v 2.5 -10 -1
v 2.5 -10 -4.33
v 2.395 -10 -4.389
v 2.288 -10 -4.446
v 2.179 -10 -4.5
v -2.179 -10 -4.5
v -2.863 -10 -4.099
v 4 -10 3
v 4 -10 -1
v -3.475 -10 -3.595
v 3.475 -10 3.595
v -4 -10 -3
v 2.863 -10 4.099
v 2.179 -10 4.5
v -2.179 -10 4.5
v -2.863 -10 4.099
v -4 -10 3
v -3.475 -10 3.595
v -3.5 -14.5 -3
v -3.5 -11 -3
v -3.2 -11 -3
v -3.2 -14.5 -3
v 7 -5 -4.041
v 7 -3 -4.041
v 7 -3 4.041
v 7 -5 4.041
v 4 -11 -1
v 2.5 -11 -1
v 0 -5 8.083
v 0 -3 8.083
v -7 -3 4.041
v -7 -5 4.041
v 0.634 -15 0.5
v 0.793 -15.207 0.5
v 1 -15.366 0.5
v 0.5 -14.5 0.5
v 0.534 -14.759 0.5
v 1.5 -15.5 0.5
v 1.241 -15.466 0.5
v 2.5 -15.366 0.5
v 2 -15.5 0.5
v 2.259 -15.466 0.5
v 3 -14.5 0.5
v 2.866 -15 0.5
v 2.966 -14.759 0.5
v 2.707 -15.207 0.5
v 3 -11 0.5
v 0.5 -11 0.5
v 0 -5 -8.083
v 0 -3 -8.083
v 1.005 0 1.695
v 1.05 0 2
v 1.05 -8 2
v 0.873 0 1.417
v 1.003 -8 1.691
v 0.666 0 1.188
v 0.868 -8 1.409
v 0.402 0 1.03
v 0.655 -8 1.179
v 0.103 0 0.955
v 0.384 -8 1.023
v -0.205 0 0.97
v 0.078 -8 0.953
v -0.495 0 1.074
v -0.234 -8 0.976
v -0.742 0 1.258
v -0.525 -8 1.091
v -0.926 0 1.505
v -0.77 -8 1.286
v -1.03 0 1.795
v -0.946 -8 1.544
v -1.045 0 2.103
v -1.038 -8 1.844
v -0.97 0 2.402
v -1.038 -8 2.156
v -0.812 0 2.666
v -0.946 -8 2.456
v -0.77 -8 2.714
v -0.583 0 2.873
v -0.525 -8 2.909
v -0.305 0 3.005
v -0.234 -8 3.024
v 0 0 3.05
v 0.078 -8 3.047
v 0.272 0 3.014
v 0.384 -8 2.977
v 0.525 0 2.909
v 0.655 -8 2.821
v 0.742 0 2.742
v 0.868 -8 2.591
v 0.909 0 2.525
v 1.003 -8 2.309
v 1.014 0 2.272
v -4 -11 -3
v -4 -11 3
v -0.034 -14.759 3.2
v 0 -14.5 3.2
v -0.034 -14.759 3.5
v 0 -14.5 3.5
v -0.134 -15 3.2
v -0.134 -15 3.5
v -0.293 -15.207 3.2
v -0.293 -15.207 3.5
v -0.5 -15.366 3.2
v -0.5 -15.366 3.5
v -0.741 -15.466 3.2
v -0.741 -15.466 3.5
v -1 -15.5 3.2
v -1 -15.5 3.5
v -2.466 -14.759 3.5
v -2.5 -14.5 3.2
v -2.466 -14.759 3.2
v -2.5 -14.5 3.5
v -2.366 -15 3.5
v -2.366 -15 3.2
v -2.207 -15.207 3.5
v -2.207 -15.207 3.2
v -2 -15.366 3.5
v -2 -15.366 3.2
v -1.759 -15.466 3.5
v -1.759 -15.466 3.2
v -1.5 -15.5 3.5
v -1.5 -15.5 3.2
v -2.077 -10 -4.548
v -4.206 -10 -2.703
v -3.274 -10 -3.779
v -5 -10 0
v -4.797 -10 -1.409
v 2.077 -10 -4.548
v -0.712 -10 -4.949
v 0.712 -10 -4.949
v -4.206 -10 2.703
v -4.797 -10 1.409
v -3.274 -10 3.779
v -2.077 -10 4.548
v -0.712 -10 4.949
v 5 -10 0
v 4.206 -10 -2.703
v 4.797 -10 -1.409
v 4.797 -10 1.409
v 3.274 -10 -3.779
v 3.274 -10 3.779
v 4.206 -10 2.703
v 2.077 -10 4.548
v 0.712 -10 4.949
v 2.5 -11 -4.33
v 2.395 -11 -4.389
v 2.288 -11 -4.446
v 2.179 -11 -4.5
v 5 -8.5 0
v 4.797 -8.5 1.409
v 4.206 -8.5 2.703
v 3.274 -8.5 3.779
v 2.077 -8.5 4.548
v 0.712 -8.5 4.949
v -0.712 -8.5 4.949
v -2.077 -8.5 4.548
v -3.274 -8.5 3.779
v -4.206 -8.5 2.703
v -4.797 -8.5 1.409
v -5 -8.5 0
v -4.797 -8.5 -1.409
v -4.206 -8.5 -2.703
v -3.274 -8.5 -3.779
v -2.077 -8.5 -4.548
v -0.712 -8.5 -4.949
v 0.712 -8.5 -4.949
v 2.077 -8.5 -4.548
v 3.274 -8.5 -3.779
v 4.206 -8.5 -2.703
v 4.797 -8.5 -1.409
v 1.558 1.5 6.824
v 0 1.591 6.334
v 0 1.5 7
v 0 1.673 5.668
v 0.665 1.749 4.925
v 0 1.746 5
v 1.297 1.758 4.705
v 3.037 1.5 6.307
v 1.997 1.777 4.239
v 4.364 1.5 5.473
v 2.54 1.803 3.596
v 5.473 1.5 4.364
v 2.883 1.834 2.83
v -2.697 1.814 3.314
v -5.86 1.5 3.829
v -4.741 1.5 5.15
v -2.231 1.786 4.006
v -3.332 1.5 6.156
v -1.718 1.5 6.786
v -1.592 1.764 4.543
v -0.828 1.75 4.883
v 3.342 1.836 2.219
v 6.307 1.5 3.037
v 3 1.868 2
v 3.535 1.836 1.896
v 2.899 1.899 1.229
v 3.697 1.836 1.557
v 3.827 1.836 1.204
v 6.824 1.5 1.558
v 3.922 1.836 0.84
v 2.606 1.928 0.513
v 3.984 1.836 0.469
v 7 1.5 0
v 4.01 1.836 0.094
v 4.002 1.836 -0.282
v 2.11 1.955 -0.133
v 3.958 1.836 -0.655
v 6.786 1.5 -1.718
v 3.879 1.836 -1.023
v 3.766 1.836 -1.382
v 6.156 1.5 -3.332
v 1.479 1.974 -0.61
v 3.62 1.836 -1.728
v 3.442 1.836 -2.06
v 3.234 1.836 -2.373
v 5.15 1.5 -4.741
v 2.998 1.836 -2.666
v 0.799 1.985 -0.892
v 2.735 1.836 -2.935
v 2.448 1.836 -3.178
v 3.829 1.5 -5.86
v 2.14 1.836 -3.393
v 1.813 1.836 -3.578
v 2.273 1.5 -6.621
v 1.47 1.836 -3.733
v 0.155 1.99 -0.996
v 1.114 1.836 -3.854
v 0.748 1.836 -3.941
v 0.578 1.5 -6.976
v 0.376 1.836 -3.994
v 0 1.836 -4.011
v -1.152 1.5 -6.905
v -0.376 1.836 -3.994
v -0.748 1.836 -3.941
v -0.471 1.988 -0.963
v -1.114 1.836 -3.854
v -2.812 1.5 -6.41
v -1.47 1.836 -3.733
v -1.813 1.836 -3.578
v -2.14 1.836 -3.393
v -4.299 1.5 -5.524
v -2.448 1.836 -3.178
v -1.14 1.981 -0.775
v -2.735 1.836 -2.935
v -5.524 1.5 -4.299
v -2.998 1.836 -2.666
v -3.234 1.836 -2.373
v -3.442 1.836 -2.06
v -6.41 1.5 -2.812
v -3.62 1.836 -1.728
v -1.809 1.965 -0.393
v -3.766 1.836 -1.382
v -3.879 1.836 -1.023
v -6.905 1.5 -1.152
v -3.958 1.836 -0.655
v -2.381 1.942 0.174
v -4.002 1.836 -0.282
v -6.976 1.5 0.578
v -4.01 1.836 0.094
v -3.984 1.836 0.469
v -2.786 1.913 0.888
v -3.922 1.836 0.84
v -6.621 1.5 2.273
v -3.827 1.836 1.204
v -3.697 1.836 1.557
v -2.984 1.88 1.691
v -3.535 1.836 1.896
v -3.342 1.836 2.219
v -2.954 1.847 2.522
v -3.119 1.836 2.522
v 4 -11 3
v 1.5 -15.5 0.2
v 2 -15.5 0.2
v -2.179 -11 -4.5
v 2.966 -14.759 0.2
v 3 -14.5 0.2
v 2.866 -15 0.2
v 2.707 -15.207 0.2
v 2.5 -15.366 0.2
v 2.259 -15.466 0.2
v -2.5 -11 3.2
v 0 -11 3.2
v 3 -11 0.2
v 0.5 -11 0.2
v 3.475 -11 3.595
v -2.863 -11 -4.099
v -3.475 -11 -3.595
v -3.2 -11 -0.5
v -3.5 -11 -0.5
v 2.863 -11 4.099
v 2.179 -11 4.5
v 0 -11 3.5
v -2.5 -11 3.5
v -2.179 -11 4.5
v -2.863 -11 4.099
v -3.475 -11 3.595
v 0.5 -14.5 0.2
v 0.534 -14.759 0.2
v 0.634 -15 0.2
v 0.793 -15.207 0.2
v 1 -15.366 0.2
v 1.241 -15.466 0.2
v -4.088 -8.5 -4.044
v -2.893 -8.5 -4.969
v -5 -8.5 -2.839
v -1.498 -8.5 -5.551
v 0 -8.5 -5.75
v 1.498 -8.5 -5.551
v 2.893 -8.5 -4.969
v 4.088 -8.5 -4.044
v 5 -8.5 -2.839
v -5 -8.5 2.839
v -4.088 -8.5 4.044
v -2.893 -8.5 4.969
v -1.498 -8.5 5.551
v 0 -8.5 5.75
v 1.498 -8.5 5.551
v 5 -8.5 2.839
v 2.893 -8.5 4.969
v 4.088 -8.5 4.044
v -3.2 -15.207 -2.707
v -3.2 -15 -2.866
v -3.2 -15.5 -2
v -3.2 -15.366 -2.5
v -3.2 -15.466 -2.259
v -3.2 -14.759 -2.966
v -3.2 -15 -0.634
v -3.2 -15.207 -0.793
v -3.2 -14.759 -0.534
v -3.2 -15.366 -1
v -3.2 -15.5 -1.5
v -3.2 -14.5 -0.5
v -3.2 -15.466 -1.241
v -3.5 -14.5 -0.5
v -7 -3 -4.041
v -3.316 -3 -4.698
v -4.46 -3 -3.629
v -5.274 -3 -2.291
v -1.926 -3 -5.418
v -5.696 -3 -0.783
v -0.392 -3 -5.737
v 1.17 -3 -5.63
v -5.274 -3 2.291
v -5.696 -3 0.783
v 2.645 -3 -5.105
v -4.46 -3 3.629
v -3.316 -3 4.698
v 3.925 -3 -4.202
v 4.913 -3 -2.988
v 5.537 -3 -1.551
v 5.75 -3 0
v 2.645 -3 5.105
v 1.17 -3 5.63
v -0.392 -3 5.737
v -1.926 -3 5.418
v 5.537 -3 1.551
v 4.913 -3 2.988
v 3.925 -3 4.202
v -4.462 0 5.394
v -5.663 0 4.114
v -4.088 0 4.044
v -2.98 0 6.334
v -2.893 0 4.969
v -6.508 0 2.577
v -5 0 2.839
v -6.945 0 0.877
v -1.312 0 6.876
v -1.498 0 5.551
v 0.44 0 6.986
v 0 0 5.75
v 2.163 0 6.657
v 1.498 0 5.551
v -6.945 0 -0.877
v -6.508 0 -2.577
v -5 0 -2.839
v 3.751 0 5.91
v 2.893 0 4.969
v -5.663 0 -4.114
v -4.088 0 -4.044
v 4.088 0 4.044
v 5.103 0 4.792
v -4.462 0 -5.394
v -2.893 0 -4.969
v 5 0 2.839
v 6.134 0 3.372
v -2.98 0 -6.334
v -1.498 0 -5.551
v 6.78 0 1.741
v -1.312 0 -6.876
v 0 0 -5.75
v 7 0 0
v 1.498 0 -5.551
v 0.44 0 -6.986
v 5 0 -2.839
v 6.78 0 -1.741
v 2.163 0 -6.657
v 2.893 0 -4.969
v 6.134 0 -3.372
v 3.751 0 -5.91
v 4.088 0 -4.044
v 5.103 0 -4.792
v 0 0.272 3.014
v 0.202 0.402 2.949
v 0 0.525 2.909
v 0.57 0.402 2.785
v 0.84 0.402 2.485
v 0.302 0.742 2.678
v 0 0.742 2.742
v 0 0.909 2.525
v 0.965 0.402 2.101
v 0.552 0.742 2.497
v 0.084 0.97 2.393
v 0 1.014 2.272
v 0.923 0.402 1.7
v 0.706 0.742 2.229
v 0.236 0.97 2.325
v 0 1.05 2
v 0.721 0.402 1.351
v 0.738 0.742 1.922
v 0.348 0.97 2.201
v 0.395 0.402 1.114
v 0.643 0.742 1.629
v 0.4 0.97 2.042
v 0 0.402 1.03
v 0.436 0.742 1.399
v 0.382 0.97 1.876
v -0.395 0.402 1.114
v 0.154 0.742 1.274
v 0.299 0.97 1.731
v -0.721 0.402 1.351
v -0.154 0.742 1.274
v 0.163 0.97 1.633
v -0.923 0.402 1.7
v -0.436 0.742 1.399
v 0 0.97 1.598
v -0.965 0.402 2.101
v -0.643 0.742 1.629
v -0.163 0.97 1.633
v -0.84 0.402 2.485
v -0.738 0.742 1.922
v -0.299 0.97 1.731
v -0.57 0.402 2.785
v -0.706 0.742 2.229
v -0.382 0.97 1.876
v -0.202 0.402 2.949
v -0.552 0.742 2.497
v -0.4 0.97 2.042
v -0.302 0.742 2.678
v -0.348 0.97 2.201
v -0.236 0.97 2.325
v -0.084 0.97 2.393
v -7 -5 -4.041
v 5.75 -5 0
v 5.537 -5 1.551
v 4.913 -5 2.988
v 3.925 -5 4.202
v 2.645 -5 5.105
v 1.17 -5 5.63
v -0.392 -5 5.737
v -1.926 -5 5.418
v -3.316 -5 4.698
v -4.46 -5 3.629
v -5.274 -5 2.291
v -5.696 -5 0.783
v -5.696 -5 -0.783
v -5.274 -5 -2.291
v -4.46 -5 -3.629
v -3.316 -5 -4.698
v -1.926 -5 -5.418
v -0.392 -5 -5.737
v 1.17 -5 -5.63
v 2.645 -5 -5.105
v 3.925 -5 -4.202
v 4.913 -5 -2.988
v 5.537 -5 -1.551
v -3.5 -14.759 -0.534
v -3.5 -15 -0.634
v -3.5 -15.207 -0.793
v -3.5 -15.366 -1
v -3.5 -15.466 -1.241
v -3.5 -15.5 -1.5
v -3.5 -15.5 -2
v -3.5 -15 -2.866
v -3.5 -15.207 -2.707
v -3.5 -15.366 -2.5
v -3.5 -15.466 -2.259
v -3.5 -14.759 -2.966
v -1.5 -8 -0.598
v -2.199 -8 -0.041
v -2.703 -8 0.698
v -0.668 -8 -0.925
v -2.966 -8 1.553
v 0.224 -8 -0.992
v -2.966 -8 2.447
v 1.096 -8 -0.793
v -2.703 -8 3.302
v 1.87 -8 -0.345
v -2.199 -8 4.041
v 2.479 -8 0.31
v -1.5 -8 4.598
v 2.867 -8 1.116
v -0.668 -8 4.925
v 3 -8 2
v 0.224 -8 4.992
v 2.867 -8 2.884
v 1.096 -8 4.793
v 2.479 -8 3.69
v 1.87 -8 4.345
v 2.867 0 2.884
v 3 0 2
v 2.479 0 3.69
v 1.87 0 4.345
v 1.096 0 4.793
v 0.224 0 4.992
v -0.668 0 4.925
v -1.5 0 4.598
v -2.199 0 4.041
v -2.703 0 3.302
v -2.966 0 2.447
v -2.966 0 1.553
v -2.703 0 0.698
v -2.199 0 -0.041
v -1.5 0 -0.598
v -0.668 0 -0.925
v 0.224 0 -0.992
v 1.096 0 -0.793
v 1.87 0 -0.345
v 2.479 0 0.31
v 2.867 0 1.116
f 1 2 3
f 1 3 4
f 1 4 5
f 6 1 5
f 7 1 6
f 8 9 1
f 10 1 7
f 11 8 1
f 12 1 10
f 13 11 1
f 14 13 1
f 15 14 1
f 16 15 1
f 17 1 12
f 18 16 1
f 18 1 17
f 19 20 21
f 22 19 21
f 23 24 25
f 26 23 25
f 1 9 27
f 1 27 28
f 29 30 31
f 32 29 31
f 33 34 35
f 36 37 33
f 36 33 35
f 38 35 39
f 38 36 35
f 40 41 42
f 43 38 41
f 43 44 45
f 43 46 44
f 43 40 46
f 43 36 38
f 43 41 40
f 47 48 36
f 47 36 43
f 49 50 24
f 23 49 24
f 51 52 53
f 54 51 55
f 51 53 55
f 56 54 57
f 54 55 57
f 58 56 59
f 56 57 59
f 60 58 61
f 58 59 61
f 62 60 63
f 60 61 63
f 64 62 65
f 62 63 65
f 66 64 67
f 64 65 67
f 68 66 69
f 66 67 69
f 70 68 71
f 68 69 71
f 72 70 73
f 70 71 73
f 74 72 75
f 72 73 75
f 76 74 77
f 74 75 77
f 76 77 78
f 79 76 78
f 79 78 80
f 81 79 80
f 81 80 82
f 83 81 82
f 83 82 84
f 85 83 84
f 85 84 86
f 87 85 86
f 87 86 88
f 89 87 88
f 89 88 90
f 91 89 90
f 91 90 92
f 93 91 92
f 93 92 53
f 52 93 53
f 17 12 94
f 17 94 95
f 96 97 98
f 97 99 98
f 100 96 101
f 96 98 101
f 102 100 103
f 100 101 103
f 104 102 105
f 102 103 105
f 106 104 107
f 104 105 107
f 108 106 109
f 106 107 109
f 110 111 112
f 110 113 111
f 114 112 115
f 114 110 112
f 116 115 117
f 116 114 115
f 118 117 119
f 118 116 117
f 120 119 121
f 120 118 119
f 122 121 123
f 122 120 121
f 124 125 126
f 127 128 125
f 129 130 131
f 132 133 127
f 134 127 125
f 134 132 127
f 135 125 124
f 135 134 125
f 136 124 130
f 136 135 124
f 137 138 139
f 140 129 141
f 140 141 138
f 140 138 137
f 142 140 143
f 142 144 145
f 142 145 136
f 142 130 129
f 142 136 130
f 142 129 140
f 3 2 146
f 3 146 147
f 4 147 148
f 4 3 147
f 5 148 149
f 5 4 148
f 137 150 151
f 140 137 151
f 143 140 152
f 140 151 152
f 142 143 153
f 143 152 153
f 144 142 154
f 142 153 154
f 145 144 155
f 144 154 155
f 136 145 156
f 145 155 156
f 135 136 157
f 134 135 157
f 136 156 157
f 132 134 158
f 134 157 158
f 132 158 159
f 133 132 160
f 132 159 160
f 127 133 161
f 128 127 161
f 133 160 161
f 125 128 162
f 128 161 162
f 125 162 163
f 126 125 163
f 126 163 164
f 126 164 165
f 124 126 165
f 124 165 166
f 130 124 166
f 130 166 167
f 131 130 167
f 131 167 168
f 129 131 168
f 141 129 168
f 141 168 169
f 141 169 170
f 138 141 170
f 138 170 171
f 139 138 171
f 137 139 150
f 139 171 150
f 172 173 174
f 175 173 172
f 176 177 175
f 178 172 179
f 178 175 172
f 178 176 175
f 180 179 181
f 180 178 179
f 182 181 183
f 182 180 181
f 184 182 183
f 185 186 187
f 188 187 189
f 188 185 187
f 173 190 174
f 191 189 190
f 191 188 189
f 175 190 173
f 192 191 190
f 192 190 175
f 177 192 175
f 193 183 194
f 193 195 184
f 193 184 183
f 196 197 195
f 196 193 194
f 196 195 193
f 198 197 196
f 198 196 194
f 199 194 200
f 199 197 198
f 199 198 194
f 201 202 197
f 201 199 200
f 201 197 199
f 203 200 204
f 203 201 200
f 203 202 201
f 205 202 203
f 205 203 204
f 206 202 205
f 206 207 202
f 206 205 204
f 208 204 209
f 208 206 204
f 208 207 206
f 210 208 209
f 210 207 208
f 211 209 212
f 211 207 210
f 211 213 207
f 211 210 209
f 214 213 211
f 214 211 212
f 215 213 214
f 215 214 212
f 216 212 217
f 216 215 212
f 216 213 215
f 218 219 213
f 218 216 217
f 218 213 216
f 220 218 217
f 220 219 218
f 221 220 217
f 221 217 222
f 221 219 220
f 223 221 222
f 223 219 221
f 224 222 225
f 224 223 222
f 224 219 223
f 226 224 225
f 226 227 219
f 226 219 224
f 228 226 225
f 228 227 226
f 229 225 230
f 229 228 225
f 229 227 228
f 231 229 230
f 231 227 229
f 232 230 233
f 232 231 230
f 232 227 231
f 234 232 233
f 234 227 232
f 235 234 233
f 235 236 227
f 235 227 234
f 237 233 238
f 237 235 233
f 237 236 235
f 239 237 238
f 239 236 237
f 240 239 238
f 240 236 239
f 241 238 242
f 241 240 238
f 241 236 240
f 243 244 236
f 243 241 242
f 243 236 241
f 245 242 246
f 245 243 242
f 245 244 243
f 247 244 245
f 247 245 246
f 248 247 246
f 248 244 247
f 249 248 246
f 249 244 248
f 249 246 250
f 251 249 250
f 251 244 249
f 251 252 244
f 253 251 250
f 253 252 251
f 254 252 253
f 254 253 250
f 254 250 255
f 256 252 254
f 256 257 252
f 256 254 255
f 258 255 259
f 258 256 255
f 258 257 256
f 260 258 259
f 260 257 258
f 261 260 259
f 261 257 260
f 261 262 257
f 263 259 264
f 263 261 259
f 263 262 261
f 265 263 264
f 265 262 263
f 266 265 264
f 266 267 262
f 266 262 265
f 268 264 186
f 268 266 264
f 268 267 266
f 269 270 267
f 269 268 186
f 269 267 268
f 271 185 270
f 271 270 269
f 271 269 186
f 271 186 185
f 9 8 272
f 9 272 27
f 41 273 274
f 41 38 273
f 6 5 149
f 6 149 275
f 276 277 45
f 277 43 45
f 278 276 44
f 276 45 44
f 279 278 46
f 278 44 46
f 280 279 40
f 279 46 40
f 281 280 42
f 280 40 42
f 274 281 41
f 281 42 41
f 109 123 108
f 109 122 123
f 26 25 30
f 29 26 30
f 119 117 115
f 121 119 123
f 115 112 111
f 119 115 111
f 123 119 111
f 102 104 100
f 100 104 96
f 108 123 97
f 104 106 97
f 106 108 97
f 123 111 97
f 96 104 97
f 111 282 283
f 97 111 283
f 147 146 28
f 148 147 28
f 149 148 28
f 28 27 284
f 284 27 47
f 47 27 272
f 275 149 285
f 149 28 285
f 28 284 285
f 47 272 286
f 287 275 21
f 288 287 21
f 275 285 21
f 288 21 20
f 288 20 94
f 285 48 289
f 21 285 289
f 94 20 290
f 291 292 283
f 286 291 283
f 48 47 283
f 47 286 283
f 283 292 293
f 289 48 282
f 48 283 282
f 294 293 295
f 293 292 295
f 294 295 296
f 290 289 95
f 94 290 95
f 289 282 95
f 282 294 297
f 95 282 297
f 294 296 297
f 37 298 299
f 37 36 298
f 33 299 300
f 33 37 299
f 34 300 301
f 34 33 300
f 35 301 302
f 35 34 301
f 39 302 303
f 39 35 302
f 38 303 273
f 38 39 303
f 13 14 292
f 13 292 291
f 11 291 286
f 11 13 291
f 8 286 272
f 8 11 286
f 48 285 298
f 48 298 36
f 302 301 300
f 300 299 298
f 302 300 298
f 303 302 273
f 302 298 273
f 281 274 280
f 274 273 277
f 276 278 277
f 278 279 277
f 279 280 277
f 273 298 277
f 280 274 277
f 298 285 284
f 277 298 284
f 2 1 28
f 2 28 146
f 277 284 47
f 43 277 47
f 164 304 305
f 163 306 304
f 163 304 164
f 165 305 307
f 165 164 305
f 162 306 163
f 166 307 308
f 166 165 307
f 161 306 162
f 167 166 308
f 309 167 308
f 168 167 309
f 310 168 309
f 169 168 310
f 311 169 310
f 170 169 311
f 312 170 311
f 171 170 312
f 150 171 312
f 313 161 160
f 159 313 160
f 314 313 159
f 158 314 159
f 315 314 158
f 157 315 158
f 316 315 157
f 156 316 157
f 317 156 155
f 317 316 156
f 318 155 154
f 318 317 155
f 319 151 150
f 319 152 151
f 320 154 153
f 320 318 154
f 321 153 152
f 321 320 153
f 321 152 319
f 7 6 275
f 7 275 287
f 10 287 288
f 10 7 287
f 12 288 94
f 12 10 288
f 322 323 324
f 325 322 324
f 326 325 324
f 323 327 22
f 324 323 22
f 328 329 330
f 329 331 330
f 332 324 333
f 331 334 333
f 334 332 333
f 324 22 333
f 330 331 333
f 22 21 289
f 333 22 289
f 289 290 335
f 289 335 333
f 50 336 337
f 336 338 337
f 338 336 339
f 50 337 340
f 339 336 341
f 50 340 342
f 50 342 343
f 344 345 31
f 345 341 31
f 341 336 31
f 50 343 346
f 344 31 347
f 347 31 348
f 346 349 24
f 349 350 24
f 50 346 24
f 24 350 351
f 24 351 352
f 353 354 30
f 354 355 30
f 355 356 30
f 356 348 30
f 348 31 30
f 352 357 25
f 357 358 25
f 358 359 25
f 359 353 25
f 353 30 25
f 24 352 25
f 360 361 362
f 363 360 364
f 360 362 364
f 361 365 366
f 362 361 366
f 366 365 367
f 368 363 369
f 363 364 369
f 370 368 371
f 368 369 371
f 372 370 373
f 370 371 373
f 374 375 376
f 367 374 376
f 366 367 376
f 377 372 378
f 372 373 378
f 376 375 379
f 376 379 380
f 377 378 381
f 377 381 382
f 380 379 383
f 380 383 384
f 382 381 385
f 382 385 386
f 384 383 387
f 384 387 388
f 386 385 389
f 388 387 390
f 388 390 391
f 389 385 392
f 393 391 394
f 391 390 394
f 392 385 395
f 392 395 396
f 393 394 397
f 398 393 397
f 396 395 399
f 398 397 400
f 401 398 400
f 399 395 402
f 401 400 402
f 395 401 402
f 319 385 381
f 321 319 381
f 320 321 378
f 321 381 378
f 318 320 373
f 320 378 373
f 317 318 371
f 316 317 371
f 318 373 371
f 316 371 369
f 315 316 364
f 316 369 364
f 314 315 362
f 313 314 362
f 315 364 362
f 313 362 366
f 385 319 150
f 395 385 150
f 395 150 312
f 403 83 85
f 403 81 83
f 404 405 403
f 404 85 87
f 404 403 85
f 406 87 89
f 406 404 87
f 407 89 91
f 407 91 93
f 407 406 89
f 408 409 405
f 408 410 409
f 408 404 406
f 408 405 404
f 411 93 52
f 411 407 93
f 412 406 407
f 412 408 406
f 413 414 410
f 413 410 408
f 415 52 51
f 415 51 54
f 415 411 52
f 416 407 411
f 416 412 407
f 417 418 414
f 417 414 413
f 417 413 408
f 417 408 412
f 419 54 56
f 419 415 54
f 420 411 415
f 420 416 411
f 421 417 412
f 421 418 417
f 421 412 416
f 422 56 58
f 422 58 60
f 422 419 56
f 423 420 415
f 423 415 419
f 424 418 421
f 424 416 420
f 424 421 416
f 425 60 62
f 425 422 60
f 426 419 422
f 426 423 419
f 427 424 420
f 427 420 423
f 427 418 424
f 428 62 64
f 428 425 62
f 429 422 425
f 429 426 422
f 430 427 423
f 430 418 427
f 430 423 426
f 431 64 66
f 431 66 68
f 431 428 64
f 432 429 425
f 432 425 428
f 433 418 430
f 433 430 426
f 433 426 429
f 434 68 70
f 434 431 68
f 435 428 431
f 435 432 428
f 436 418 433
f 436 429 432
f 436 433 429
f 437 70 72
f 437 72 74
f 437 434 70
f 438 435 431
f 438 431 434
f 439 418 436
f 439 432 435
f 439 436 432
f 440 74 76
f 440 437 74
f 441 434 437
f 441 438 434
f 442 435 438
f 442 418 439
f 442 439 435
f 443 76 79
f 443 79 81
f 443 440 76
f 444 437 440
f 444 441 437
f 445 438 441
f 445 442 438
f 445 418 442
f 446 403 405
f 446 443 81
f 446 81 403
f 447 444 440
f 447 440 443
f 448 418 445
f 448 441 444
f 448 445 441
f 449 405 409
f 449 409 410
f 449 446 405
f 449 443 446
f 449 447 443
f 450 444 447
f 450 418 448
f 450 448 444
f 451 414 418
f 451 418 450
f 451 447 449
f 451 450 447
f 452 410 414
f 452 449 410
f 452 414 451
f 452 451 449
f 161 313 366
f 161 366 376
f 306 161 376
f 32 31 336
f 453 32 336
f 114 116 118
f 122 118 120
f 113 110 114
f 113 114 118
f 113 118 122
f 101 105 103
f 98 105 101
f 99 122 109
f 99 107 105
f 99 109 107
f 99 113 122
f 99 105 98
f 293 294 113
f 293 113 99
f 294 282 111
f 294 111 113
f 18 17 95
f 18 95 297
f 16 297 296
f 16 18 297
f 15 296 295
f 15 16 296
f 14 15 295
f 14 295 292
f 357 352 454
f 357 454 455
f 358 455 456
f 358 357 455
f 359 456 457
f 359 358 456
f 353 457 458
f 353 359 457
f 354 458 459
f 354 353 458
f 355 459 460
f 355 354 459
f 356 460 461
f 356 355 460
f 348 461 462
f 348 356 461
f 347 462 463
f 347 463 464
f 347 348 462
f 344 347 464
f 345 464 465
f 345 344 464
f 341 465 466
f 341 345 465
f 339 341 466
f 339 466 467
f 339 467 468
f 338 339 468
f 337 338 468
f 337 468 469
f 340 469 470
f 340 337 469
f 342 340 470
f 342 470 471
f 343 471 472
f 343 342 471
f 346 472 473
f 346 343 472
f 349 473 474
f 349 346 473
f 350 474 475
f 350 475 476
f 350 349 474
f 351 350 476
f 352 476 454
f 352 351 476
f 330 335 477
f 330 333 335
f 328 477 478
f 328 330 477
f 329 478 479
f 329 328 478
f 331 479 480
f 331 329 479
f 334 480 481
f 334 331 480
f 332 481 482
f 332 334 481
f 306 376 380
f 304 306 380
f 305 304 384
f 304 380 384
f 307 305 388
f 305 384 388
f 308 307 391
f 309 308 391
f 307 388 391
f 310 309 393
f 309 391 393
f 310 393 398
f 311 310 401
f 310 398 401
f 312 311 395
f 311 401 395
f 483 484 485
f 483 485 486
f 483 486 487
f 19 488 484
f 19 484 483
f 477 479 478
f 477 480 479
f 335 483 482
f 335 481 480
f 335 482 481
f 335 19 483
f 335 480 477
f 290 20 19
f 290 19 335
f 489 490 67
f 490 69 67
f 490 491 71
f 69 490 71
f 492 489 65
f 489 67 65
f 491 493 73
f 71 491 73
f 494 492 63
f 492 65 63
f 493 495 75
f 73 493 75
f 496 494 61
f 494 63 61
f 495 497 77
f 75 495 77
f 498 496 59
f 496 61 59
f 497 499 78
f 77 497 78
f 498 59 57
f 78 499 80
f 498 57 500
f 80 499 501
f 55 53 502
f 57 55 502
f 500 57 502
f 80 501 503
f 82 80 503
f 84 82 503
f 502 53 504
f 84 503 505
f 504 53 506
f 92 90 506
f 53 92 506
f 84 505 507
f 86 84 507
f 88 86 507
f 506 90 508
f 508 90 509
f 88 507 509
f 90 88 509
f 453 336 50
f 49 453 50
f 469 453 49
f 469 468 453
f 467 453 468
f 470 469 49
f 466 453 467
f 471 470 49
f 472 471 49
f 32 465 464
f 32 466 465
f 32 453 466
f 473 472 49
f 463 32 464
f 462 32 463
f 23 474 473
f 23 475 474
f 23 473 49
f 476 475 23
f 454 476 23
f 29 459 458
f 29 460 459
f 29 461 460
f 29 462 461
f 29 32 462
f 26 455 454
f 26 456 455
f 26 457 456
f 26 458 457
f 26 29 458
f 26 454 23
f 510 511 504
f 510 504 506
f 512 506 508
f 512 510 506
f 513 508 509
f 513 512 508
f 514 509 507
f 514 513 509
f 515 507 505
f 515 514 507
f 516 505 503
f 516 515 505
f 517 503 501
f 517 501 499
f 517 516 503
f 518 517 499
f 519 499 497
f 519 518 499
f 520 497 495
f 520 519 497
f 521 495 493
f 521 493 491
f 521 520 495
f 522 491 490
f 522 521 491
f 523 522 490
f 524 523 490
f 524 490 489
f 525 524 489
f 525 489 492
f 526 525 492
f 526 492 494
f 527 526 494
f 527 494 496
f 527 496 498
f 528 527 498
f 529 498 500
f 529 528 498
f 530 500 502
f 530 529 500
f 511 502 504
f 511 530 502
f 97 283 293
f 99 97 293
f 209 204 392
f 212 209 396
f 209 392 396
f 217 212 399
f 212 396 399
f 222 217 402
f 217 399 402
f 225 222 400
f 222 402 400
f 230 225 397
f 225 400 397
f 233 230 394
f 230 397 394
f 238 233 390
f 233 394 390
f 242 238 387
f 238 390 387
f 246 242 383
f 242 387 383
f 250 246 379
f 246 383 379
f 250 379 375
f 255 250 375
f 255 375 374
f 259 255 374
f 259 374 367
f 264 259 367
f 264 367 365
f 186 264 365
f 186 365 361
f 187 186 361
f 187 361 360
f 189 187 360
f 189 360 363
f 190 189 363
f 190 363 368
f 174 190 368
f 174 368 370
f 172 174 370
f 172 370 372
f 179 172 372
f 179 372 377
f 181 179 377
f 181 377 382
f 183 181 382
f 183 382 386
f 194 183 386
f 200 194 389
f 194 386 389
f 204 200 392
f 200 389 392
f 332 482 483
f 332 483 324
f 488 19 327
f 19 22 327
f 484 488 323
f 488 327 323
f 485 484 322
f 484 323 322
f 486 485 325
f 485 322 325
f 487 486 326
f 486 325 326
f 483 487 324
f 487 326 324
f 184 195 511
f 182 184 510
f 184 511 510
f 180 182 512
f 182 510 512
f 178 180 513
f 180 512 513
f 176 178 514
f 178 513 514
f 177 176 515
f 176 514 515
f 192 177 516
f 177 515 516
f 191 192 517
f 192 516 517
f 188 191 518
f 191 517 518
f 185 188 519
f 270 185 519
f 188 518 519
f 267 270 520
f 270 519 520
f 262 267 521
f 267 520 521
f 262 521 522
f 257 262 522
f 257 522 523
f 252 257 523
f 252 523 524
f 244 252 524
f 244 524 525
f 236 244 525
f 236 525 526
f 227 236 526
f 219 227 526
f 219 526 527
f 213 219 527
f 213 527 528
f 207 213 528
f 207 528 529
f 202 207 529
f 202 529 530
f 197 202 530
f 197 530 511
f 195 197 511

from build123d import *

# Parameters (mm, degrees)
SKETCH1_R               = 7
BOSS_EXTRUDE1_DEPTH     = 1.5
DOME1_FACE_RADIUS       = 7
DOME1_HEIGHT            = 0.5
SKETCH2_R               = 5.75
BOSS_EXTRUDE2_DEPTH     = 8.5
SKETCH3_R               = 5
BOSS_EXTRUDE3_DEPTH     = 1.5
CUT_EXTRUDE1_DEPTH      = 8.5
BOSS_EXTRUDE5_DEPTH     = 1
SKETCH6_R               = 3
CUT_EXTRUDE2_DEPTH      = 8
CUT_EXTRUDE2_DEPTH_BACK = 3
SKETCH7_R               = 1.05
BOSS_EXTRUDE6_DEPTH     = 8
DOME2_FACE_RADIUS       = 1.05
DOME2_HEIGHT            = 1.05
BOSS_EXTRUDE7_START     = 3
SKETCH8_R               = 5.75
BOSS_EXTRUDE7_DEPTH     = 2
SKETCH9_W               = 2.5
SKETCH9_H               = 0.3
SKETCH9_W_2             = 0.3
SKETCH9_H_2             = 2.5
BOSS_EXTRUDE8_DEPTH     = 4.5
FILLET1_R               = 1


with BuildPart() as part:
    # Sketch1 → Boss-Extrude1 (new body)
    with BuildSketch(Plane(origin=(0, 0, 0), x_dir=(1, 0, 0), z_dir=(0, 1, 0))):
        Circle(SKETCH1_R)
    extrude(amount=BOSS_EXTRUDE1_DEPTH)

    # Dome1: a dome of height H over a round flat face of radius A is a cap of a sphere of radius (A * A + H * H) / (2 * H)
    dome1_r = (DOME1_FACE_RADIUS * DOME1_FACE_RADIUS + DOME1_HEIGHT * DOME1_HEIGHT) / (2 * DOME1_HEIGHT)
    dome1_base = Plane((0, 1.5, 0), z_dir=(0, 1, 0))
    with Locations(dome1_base.offset(DOME1_HEIGHT - dome1_r)):
        dome1_ball = Sphere(dome1_r, mode=Mode.PRIVATE)
    add(split(dome1_ball, bisect_by=dome1_base, keep=Keep.TOP, mode=Mode.PRIVATE))

    # Sketch2 → Boss-Extrude2 (add)
    with BuildSketch(Plane.XZ):
        Circle(SKETCH2_R)
    extrude(amount=BOSS_EXTRUDE2_DEPTH)

    # Sketch3 → Boss-Extrude3 (add)
    with BuildSketch(Plane.XZ.offset(8.5)):
        Circle(SKETCH3_R)
    extrude(amount=BOSS_EXTRUDE3_DEPTH)

    # Sketch4 → Cut-Extrude1 (cut)
    with BuildSketch(Plane.XZ.offset(8.5)):
        with BuildLine():
            Line((-5, 2.839454173), (-5, -2.839454173))
            ThreePointArc((-5, -2.839454173), (-5.75, 0), (-5, 2.839454173))
        make_face()
        with BuildLine():
            Line((5, 2.839454173), (5, -2.839454173))
            ThreePointArc((5, -2.839454173), (5.75, 0), (5, 2.839454173))
        make_face()
    extrude(amount=-CUT_EXTRUDE1_DEPTH, mode=Mode.SUBTRACT)

    # Sketch6 → Cut-Extrude2 (cut, two sides)
    with BuildSketch(Plane.XZ) as cut_extrude2_sk:
        with Locations((0, 2)):
            Circle(SKETCH6_R)
    extrude(amount=CUT_EXTRUDE2_DEPTH, mode=Mode.SUBTRACT)
    extrude(cut_extrude2_sk.sketch, amount=-CUT_EXTRUDE2_DEPTH_BACK, mode=Mode.SUBTRACT)

    # Sketch7 → Boss-Extrude6 (add)
    with BuildSketch(Plane(origin=(0, -8, 0), x_dir=(1, 0, 0), z_dir=(0, 1, 0))):
        with Locations((0, -2)):
            Circle(SKETCH7_R)
    extrude(amount=BOSS_EXTRUDE6_DEPTH)

    # Dome2: a dome of height H over a round flat face of radius A is a cap of a sphere of radius (A * A + H * H) / (2 * H)
    dome2_r = (DOME2_FACE_RADIUS * DOME2_FACE_RADIUS + DOME2_HEIGHT * DOME2_HEIGHT) / (2 * DOME2_HEIGHT)
    dome2_base = Plane((0, 0, 2), z_dir=(0, 1, 0))
    with Locations(dome2_base.offset(DOME2_HEIGHT - dome2_r)):
        dome2_ball = Sphere(dome2_r, mode=Mode.PRIVATE)
    add(split(dome2_ball, bisect_by=dome2_base, keep=Keep.TOP, mode=Mode.PRIVATE))


with BuildPart() as body_2:
    # Sketch5 → Boss-Extrude5 (new body)
    with BuildSketch(Plane.XZ.offset(10)):
        with BuildLine():
            Line((-2.179449472, 4.5), (2.179449472, 4.5))
            ThreePointArc((2.179449472, 4.5), (3.179449472, 3.858898944), (4, 3))
            Line((4, 3), (4, -1))
            Line((4, -1), (2.5, -1))
            Line((2.5, -1), (2.5, -4.330127019))
            ThreePointArc((2.5, -4.330127019), (2.341265907, -4.417971701), (2.179449472, -4.5))
            Line((2.179449472, -4.5), (-2.179449472, -4.5))
            ThreePointArc((-2.179449472, -4.5), (-3.179449472, -3.858898944), (-4, -3))
            Line((-4, -3), (-4, 3))
            ThreePointArc((-4, 3), (-3.179449472, 3.858898944), (-2.179449472, 4.5))
        make_face()
    extrude(amount=BOSS_EXTRUDE5_DEPTH)

    # Sketch9 → Boss-Extrude8 (add)
    with BuildSketch(Plane.XZ.offset(11)):
        with Locations((-1.25, 3.35)):
            Rectangle(SKETCH9_W, SKETCH9_H)
        with Locations((1.75, 0.35)):
            Rectangle(SKETCH9_W, SKETCH9_H)
        with Locations((-3.35, -1.75)):
            Rectangle(SKETCH9_W_2, SKETCH9_H_2)
    extrude(amount=BOSS_EXTRUDE8_DEPTH)

    # Fillet1
    fillet1_edges = [body_2.edges().sort_by_distance(p)[0] for p in [
        (-2.5, -15.5, 3.35),
        (0, -15.5, 3.35),
        (0.5, -15.5, 0.35),
        (3, -15.5, 0.35),
        (-3.35, -15.5, -3),
        (-3.35, -15.5, -0.5),
    ]]
    fillet(fillet1_edges, radius=FILLET1_R)


with BuildPart() as body_3:
    # Sketch8 → Boss-Extrude7 (new body)
    with BuildSketch(Plane.XZ.offset(BOSS_EXTRUDE7_START)):
        Polygon((7, -4.041451884), (7, 4.041451884), (0, 8.082903769), (-7, 4.041451884), (-7, -4.041451884), (0, -8.082903769), align=None)
        Circle(SKETCH8_R, mode=Mode.SUBTRACT)
    extrude(amount=BOSS_EXTRUDE7_DEPTH)


solid = Compound([part.part, body_2.part, body_3.part])
